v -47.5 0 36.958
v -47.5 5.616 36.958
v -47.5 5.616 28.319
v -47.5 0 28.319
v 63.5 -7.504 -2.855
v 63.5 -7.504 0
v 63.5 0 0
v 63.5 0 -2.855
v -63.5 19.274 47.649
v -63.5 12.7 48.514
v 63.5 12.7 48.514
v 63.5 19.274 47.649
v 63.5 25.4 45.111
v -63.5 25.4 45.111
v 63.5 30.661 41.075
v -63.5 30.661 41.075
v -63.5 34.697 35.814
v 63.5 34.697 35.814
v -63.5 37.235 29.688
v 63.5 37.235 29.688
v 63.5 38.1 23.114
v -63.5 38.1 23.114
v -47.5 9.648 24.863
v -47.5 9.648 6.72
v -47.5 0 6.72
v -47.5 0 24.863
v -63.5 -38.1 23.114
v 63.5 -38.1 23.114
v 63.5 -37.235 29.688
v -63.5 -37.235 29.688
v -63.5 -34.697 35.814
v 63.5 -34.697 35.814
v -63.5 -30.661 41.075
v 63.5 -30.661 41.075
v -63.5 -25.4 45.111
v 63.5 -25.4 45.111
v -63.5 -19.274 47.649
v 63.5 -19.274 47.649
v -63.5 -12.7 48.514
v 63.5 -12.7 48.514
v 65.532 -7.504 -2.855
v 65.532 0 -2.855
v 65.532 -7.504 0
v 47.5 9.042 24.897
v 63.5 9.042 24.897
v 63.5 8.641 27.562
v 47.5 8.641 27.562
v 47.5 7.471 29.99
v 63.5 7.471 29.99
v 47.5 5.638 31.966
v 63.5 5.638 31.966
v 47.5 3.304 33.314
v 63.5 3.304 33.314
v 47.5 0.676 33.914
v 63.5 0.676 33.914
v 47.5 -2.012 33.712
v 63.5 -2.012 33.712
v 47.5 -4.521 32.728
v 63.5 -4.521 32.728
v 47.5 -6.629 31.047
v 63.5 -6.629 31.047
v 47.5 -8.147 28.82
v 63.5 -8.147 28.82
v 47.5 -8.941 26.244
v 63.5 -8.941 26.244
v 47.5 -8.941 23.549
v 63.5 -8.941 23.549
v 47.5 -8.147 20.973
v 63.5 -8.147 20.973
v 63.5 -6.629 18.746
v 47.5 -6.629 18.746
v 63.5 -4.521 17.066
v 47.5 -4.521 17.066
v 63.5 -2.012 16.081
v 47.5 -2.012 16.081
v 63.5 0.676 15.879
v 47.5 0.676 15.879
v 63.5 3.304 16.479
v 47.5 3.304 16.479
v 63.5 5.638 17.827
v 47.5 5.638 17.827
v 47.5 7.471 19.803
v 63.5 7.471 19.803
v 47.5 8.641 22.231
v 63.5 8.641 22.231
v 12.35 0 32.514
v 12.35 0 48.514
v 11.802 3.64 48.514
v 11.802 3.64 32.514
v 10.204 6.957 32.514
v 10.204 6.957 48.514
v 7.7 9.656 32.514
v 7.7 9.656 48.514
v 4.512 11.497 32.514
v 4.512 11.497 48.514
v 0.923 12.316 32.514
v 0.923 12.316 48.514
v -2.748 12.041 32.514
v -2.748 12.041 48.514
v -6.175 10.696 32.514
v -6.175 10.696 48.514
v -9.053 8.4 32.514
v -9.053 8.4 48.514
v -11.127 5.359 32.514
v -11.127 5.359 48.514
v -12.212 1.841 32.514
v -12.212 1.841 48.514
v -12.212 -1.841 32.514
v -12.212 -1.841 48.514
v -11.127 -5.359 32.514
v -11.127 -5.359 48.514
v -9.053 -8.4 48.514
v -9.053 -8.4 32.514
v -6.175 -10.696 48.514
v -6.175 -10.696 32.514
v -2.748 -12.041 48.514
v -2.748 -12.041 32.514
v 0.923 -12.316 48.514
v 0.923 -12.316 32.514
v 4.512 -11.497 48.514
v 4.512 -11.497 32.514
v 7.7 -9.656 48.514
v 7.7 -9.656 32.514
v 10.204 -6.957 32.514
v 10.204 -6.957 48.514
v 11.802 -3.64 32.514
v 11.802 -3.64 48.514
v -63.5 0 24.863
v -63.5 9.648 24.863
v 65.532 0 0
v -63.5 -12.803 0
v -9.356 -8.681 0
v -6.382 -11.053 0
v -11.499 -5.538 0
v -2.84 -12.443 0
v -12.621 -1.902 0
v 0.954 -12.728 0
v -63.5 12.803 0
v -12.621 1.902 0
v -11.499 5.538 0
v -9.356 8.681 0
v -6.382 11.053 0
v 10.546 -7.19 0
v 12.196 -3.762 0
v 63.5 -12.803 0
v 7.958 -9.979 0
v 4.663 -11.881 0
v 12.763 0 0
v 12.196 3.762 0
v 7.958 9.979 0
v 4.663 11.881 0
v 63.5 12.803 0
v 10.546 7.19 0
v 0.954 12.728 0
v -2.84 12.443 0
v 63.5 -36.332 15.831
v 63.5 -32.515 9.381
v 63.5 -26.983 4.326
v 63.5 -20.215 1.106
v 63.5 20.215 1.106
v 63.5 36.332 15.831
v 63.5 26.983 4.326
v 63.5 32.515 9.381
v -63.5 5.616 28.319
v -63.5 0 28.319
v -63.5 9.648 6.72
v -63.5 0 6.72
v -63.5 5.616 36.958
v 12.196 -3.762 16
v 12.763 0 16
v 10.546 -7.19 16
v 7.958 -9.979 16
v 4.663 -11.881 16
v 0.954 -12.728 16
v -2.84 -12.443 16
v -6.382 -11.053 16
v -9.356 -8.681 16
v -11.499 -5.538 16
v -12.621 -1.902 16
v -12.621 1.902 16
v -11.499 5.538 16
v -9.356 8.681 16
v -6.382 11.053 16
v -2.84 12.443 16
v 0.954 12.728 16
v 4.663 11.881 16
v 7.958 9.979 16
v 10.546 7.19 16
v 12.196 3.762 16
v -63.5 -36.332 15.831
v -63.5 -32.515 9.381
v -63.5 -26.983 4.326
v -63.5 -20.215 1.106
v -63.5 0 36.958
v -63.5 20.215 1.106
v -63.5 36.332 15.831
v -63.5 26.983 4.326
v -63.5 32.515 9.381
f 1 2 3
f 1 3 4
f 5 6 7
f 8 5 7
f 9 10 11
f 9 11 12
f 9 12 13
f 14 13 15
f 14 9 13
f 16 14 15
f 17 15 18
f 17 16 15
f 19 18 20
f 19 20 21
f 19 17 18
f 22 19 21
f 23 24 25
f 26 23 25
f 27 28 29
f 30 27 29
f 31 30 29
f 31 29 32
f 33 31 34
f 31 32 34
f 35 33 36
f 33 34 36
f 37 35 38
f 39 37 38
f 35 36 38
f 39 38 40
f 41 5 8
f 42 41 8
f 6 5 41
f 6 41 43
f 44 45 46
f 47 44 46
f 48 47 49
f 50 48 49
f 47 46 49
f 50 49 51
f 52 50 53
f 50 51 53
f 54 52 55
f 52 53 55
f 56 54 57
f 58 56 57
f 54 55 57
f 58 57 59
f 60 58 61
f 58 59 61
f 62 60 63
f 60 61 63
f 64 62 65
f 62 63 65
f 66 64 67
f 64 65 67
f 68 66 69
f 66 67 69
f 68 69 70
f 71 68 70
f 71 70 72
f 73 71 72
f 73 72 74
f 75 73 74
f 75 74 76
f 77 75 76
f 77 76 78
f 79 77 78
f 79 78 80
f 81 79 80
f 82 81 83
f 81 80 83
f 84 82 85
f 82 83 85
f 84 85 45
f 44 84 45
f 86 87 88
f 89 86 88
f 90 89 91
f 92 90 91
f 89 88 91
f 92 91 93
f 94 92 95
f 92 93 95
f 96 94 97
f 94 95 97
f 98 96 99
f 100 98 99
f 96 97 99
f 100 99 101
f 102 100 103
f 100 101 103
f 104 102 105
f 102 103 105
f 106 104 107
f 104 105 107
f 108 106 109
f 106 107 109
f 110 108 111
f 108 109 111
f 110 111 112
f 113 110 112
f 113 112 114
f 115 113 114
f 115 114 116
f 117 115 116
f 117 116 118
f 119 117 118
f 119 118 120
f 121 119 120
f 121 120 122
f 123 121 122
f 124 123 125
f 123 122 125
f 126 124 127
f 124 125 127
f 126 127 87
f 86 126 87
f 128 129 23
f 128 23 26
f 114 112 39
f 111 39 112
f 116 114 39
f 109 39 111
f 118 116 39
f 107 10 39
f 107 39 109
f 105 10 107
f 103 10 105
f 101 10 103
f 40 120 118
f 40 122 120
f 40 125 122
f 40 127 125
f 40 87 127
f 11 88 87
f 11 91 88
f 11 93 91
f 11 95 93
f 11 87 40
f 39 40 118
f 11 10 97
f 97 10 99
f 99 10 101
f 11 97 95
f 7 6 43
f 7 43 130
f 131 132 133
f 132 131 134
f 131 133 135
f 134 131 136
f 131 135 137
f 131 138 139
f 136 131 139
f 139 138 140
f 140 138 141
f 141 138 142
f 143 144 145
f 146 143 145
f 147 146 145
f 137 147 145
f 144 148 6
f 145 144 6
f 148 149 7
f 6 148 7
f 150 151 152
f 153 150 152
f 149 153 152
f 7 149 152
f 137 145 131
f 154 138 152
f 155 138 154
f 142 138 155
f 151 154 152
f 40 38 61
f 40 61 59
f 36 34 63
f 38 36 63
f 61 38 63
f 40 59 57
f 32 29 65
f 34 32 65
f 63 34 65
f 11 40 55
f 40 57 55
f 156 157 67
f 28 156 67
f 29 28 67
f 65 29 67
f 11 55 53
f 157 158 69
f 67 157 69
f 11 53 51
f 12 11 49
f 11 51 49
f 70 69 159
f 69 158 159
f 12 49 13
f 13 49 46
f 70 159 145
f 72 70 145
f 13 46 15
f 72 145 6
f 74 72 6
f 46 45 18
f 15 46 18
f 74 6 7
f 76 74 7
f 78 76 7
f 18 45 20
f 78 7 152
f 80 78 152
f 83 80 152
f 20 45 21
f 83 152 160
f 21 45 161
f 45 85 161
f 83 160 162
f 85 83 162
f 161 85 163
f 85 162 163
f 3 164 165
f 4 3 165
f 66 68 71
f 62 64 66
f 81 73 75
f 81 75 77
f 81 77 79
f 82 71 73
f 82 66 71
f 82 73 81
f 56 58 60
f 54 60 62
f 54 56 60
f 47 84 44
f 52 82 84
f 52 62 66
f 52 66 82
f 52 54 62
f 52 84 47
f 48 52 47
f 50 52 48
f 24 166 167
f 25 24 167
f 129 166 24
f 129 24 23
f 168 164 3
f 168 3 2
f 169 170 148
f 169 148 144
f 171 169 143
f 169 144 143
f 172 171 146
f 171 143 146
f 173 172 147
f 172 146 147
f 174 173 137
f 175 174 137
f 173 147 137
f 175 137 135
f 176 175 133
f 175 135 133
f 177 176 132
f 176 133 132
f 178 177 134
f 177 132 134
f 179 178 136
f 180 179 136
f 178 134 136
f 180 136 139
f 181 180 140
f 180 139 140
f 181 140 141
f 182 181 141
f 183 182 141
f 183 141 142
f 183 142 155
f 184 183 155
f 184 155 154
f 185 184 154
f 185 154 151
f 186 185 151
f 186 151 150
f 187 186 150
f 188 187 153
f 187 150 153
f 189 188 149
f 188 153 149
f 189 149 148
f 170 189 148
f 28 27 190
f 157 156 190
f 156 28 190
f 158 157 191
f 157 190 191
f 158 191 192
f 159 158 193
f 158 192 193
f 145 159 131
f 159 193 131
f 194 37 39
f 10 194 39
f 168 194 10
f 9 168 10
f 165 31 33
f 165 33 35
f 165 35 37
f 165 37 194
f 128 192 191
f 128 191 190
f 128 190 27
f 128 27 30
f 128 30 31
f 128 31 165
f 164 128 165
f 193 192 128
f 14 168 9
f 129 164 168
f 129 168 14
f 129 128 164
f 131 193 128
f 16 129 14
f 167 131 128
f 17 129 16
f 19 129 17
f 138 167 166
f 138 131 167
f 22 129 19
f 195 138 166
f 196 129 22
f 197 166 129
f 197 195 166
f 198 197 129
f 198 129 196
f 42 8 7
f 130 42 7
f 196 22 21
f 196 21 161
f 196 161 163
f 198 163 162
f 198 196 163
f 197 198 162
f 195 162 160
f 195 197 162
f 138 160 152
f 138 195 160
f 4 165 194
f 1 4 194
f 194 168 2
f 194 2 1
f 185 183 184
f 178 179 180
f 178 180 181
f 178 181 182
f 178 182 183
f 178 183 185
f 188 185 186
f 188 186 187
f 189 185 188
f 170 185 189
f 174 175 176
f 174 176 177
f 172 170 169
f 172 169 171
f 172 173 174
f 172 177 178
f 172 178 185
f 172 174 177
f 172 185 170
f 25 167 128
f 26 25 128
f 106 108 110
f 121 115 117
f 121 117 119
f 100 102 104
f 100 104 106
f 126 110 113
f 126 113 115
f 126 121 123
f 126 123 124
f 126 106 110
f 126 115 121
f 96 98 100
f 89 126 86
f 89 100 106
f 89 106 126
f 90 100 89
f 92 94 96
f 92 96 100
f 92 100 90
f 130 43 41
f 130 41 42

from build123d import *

# Parameters (mm, degrees)
F0_W        = 127
F0_H        = 76.2
F1_DEPTH    = 48.514
F2_R        = 25.4
F3_T1_DEPTH = 253.4846042015
F3_T3_DEPTH = 254
F4_T1_DEPTH = 253.4846042015
F5_W        = 7.5038918294
F5_H        = 2.8549211565
F6_DEPTH    = 2.032
F7_W        = 9.6475789323
F7_H        = 18.1432091631
F8_DEPTH    = 16
F9_W        = 5.6157563813
F9_H        = 8.6396243423
F10_DEPTH   = 16
F11_R       = 9.0424254563
F12_DEPTH   = 16
F13_R       = 12.7632843375
F14_DEPTH   = 16
F15_R       = 12.3503086405
F16_DEPTH   = 16
F17_R       = 4.9563337245
F18_DEPTH   = 1


# Not quite as in the source:
# - a fillet or chamfer that OpenCascade refuses, or shapes differently, is made with other operations: its cross-section is extruded or revolved along the edge and cut away or added


with BuildPart() as f1:
    # F0 (on Top) → F1 (new body)
    with BuildSketch(Plane.XY):
        Rectangle(F0_W, F0_H)
    extrude(amount=F1_DEPTH)

    # F2
    f2_edges = [f1.edges().sort_by_distance(p)[0] for p in [
        (0, -38.1, 48.514),
    ]]
    fillet(f2_edges, radius=F2_R)

    # F3: fillet of radius 25.4 on 2 edges, made by hand

    # F3_s2 → F3_t1 (cut)
    with BuildSketch(Plane.YZ.offset(-126.7423021007)):
        with BuildLine():
            ThreePointArc((-38.1, 23.114), (-29.936315865, 6.6486747135), (-12.8030791597, 0))
            Line((-12.8030791597, 0), (-38.1, 0))
            Line((-38.1, 0), (-38.1, 23.114))
        make_face()
    extrude(amount=F3_T1_DEPTH, mode=Mode.SUBTRACT)

    # F3_s4 → F3_t3 (cut)
    with BuildSketch(Plane.YZ.offset(-127)):
        with BuildLine():
            ThreePointArc((12.7, 48.514), (30.6605122421, 41.0745122421), (38.1, 23.114))
            Line((38.1, 23.114), (38.1, 48.514))
            Line((38.1, 48.514), (12.7, 48.514))
        make_face()
    extrude(amount=F3_T3_DEPTH, mode=Mode.SUBTRACT)

    # F4: fillet of radius 25.4 on 1 edges, made by hand

    # F4_s2 → F4_t1 (cut)
    with BuildSketch(Plane.YZ.offset(-126.7423021007)):
        with BuildLine():
            ThreePointArc((38.1, 23.114), (29.936315865, 6.6486747135), (12.8030791597, 0))
            Line((12.8030791597, 0), (38.1, 0))
            Line((38.1, 0), (38.1, 23.114))
        make_face()
    extrude(amount=F4_T1_DEPTH, mode=Mode.SUBTRACT)

    # F5 (on face) + F1_face1 (on face) → F6 (join)
    with BuildSketch(Plane.YZ.offset(63.5)):
        with Locations((-3.7519459147, -1.4274605783)):
            Rectangle(F5_W, F5_H)
    with BuildSketch(Plane(origin=(-63.5, 0, 24.2377466976), x_dir=(0, -1, 0), z_dir=(-1, 0, 0))):
        with BuildLine():
            ThreePointArc((38.1, -1.1237466976), (30.6605122421, 16.8367655446), (12.7, 24.2762533024))
            Line((12.7, 24.2762533024), (-12.7, 24.2762533024))
            ThreePointArc((-12.7, 24.2762533024), (-30.6605122421, 16.8367655445), (-38.1, -1.1237466976))
            ThreePointArc((-38.1, -1.1237466976), (-29.936315865, -17.5890719841), (-12.8030791597, -24.2377466976))
            Line((-12.8030791597, -24.2377466976), (12.8030791597, -24.2377466976))
            ThreePointArc((12.8030791597, -24.2377466976), (29.936315865, -17.5890719841), (38.1, -1.1237466976))
        make_face()
    extrude(amount=F6_DEPTH, dir=(1, 0, 0))

    # F7 (on face) → F8 (cut)
    with BuildSketch(Plane(origin=(-63.5, 0, 0), x_dir=(0, -1, 0), z_dir=(-1, 0, 0))):
        with Locations((-4.8237894662, 15.7912082504)):
            Rectangle(F7_W, F7_H)
    extrude(amount=-F8_DEPTH, mode=Mode.SUBTRACT)

    # F9 (on face) → F10 (cut)
    with BuildSketch(Plane(origin=(-63.5, 0, 0), x_dir=(0, -1, 0), z_dir=(-1, 0, 0))):
        with Locations((-2.8078781907, 32.6384725049)):
            Rectangle(F9_W, F9_H)
    extrude(amount=-F10_DEPTH, mode=Mode.SUBTRACT)

    # F11 (on face) → F12 (cut)
    with BuildSketch(Plane.YZ.offset(63.5)):
        with Locations((0, 24.896575138)):
            Circle(F11_R)
    extrude(amount=-F12_DEPTH, mode=Mode.SUBTRACT)

    # F13 (on face) → F14 (cut)
    with BuildSketch(Plane(origin=(0, 0, 0), x_dir=(1, 0, 0), z_dir=(0, 0, -1))):
        Circle(F13_R)
    extrude(amount=-F14_DEPTH, mode=Mode.SUBTRACT)

    # F15 (on face) → F16 (cut)
    with BuildSketch(Plane.XY.offset(48.514)):
        Circle(F15_R)
    extrude(amount=-F16_DEPTH, mode=Mode.SUBTRACT)

    # F17 (on face) → F18 (join)
    with BuildSketch(Plane.XY.offset(48.514)):
        with Locations((-48.0436608195, 0)):
            Circle(F17_R)
    extrude(amount=-F18_DEPTH)


solid = f1.part
